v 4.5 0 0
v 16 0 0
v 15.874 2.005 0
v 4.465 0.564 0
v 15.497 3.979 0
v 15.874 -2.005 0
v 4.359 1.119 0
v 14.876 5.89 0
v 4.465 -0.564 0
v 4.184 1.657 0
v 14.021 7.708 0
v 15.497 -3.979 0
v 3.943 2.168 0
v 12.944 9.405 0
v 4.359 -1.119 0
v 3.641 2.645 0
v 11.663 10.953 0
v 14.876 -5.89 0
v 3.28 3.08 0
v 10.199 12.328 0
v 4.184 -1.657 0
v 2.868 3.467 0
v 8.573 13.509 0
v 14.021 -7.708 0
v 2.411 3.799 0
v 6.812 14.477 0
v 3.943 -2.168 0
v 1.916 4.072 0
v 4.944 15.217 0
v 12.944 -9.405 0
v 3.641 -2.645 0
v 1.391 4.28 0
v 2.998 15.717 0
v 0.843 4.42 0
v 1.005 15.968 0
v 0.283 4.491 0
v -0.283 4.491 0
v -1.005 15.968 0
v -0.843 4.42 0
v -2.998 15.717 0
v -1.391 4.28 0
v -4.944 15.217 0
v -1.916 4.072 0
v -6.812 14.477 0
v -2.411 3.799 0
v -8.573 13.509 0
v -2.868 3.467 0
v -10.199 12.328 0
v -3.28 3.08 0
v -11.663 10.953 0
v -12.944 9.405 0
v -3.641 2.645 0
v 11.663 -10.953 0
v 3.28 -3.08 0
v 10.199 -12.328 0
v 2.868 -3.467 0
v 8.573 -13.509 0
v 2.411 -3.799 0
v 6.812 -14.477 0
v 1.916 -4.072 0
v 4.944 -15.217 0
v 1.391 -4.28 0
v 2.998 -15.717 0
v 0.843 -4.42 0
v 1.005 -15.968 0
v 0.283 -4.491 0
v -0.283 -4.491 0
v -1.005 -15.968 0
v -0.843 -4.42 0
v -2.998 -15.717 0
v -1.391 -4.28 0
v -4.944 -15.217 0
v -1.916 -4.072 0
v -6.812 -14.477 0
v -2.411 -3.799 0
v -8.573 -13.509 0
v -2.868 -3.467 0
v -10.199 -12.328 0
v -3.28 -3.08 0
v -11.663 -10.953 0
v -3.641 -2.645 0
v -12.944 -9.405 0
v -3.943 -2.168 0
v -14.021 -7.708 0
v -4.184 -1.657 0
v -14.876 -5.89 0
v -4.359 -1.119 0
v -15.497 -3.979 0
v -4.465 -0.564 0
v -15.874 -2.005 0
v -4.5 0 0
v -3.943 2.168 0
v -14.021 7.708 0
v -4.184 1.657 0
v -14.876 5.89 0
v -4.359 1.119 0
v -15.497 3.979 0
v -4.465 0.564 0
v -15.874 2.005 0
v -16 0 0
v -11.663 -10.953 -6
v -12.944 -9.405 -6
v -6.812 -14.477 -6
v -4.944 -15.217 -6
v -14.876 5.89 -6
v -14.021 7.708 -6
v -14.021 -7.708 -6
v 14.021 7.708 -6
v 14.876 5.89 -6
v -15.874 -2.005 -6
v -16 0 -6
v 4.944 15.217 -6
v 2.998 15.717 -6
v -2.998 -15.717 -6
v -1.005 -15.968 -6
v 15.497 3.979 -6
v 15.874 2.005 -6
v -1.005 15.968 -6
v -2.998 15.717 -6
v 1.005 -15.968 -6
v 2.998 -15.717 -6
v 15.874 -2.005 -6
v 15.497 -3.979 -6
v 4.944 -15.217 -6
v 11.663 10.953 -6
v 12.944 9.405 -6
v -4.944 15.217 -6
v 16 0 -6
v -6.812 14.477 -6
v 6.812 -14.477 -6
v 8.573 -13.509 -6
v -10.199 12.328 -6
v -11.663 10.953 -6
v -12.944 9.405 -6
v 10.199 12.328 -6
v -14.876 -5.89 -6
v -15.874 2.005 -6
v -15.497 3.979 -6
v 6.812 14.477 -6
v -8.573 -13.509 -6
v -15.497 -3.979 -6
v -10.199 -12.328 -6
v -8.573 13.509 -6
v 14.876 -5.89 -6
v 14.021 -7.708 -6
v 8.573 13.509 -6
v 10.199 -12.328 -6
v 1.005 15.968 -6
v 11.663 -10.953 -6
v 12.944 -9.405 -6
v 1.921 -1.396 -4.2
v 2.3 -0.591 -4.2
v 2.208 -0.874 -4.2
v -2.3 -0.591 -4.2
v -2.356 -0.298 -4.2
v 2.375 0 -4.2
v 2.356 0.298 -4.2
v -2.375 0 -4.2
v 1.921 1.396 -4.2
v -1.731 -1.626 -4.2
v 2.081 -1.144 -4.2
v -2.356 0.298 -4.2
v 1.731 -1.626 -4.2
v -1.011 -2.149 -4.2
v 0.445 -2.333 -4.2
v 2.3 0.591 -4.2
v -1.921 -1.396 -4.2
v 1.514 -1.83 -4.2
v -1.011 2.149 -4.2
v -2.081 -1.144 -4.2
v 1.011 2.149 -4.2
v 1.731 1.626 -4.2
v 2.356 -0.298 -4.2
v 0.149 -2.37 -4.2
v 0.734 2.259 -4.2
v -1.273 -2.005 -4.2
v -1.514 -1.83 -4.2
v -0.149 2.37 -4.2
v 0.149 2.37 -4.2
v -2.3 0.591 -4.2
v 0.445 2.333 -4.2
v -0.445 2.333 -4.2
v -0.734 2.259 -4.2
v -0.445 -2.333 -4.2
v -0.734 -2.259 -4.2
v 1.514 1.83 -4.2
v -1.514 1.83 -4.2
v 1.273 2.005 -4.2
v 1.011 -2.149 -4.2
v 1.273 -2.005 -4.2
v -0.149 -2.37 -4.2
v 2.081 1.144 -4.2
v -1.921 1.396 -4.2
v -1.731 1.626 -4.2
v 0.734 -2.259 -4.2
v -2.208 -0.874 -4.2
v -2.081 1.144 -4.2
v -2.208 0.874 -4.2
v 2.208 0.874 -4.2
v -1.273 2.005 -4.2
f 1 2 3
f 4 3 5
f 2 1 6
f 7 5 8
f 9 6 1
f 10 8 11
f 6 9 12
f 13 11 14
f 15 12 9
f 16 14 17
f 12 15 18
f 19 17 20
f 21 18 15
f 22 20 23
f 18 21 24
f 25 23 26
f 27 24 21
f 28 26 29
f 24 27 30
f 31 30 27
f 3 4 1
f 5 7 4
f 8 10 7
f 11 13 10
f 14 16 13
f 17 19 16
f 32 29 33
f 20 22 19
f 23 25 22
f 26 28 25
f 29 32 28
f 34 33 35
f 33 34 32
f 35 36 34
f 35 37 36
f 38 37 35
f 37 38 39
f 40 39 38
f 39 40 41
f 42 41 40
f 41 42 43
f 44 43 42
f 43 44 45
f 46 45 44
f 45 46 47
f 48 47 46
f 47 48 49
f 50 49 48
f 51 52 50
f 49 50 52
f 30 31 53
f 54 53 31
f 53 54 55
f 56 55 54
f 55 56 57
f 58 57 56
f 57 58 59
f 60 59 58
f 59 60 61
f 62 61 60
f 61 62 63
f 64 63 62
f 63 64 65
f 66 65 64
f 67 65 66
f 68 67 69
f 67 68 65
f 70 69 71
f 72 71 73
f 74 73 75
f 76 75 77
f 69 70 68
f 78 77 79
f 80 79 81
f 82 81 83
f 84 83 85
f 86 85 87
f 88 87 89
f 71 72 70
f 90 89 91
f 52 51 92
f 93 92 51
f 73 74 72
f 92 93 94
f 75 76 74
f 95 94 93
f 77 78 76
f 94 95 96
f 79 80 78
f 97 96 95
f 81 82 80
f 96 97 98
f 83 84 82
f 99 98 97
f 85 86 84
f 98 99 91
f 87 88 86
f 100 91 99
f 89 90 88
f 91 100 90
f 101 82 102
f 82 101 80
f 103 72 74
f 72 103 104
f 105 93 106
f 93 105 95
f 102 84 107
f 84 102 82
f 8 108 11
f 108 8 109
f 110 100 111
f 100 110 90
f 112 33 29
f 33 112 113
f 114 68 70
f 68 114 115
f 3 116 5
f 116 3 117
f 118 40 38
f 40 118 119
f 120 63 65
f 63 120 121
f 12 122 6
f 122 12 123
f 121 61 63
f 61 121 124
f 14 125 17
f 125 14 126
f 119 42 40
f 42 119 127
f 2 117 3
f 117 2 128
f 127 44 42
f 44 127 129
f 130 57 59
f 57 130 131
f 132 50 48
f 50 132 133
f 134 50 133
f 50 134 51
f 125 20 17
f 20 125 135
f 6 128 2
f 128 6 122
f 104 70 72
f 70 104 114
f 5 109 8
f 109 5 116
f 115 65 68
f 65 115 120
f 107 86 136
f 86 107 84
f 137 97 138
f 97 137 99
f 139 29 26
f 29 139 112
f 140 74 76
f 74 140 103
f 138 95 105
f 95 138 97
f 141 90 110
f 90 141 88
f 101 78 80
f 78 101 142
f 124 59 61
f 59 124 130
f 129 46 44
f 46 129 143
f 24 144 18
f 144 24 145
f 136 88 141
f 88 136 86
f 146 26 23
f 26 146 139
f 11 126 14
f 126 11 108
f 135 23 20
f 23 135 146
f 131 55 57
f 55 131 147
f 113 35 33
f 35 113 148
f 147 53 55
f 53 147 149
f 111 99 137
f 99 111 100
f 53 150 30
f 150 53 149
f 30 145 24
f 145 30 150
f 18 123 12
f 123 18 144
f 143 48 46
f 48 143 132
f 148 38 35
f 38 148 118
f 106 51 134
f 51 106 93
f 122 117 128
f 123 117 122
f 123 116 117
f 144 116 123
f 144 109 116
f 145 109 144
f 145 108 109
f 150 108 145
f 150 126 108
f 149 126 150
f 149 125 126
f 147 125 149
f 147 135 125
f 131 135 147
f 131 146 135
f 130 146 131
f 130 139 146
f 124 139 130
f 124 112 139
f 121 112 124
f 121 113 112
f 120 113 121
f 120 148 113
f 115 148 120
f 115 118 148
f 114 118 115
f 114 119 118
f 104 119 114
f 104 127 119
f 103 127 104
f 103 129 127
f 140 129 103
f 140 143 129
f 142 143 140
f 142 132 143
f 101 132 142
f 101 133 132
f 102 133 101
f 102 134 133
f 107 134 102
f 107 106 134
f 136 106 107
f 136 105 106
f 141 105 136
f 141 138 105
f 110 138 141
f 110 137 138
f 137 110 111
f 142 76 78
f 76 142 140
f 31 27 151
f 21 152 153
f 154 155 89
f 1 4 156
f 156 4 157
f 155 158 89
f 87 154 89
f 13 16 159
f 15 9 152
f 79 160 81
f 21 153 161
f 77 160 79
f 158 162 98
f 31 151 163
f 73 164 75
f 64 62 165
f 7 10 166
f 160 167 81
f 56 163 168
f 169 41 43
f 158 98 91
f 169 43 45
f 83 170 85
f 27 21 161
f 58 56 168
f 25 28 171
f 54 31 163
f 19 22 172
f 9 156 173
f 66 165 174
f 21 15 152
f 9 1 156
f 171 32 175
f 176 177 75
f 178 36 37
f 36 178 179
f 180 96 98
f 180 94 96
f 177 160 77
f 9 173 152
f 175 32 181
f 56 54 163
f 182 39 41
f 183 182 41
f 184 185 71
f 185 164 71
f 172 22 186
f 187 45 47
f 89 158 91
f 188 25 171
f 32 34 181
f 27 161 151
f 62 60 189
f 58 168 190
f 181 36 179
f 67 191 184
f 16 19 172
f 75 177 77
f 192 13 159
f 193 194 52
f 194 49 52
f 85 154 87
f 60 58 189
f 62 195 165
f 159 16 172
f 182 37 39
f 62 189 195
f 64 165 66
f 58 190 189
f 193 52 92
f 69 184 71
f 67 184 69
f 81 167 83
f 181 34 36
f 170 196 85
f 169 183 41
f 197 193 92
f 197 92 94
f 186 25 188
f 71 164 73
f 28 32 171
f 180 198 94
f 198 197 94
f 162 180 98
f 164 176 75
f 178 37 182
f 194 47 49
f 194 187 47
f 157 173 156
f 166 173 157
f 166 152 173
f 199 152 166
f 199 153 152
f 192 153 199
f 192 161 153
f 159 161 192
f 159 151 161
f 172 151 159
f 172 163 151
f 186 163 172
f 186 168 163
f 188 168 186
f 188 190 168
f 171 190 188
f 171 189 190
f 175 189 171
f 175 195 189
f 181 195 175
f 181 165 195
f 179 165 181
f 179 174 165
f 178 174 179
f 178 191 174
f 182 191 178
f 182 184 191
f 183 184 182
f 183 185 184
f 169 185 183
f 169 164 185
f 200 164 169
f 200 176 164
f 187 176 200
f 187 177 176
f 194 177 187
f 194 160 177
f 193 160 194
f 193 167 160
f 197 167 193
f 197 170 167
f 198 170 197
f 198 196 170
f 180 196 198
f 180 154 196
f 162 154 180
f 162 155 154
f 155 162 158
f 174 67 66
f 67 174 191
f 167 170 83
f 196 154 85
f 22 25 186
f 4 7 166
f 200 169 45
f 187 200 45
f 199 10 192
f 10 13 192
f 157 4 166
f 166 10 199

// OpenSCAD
$fn = 50;


difference() {
	union() {
		translate(v = [0, 0, -3.0000000000]) {
			cylinder(h = 3, r = 7.0000000000);
		}
		translate(v = [0, 0, -6.0000000000]) {
			cylinder(h = 6, r = 16.0000000000);
		}
	}
	union() {
		translate(v = [0, 0, 0]) {
			rotate(a = [0, 0, 0]) {
				difference() {
					union() {
						#translate(v = [0, 0, -3.0000000000]) {
							cylinder(h = 3, r = 2.2500000000);
						}
						#translate(v = [0, 0, -4.2000000000]) {
							cylinder(h = 4.2000000000, r = 7.0000000000, r1 = 2.3750000000, r2 = 4.5000000000);
						}
						#translate(v = [0, 0, -3.0000000000]) {
							cylinder(h = 3, r = 2.3750000000);
						}
						#translate(v = [0, 0, -3.0000000000]) {
							cylinder(h = 3, r = 2.2500000000);
						}
					}
					union();
				}
			}
		}
	}
}
